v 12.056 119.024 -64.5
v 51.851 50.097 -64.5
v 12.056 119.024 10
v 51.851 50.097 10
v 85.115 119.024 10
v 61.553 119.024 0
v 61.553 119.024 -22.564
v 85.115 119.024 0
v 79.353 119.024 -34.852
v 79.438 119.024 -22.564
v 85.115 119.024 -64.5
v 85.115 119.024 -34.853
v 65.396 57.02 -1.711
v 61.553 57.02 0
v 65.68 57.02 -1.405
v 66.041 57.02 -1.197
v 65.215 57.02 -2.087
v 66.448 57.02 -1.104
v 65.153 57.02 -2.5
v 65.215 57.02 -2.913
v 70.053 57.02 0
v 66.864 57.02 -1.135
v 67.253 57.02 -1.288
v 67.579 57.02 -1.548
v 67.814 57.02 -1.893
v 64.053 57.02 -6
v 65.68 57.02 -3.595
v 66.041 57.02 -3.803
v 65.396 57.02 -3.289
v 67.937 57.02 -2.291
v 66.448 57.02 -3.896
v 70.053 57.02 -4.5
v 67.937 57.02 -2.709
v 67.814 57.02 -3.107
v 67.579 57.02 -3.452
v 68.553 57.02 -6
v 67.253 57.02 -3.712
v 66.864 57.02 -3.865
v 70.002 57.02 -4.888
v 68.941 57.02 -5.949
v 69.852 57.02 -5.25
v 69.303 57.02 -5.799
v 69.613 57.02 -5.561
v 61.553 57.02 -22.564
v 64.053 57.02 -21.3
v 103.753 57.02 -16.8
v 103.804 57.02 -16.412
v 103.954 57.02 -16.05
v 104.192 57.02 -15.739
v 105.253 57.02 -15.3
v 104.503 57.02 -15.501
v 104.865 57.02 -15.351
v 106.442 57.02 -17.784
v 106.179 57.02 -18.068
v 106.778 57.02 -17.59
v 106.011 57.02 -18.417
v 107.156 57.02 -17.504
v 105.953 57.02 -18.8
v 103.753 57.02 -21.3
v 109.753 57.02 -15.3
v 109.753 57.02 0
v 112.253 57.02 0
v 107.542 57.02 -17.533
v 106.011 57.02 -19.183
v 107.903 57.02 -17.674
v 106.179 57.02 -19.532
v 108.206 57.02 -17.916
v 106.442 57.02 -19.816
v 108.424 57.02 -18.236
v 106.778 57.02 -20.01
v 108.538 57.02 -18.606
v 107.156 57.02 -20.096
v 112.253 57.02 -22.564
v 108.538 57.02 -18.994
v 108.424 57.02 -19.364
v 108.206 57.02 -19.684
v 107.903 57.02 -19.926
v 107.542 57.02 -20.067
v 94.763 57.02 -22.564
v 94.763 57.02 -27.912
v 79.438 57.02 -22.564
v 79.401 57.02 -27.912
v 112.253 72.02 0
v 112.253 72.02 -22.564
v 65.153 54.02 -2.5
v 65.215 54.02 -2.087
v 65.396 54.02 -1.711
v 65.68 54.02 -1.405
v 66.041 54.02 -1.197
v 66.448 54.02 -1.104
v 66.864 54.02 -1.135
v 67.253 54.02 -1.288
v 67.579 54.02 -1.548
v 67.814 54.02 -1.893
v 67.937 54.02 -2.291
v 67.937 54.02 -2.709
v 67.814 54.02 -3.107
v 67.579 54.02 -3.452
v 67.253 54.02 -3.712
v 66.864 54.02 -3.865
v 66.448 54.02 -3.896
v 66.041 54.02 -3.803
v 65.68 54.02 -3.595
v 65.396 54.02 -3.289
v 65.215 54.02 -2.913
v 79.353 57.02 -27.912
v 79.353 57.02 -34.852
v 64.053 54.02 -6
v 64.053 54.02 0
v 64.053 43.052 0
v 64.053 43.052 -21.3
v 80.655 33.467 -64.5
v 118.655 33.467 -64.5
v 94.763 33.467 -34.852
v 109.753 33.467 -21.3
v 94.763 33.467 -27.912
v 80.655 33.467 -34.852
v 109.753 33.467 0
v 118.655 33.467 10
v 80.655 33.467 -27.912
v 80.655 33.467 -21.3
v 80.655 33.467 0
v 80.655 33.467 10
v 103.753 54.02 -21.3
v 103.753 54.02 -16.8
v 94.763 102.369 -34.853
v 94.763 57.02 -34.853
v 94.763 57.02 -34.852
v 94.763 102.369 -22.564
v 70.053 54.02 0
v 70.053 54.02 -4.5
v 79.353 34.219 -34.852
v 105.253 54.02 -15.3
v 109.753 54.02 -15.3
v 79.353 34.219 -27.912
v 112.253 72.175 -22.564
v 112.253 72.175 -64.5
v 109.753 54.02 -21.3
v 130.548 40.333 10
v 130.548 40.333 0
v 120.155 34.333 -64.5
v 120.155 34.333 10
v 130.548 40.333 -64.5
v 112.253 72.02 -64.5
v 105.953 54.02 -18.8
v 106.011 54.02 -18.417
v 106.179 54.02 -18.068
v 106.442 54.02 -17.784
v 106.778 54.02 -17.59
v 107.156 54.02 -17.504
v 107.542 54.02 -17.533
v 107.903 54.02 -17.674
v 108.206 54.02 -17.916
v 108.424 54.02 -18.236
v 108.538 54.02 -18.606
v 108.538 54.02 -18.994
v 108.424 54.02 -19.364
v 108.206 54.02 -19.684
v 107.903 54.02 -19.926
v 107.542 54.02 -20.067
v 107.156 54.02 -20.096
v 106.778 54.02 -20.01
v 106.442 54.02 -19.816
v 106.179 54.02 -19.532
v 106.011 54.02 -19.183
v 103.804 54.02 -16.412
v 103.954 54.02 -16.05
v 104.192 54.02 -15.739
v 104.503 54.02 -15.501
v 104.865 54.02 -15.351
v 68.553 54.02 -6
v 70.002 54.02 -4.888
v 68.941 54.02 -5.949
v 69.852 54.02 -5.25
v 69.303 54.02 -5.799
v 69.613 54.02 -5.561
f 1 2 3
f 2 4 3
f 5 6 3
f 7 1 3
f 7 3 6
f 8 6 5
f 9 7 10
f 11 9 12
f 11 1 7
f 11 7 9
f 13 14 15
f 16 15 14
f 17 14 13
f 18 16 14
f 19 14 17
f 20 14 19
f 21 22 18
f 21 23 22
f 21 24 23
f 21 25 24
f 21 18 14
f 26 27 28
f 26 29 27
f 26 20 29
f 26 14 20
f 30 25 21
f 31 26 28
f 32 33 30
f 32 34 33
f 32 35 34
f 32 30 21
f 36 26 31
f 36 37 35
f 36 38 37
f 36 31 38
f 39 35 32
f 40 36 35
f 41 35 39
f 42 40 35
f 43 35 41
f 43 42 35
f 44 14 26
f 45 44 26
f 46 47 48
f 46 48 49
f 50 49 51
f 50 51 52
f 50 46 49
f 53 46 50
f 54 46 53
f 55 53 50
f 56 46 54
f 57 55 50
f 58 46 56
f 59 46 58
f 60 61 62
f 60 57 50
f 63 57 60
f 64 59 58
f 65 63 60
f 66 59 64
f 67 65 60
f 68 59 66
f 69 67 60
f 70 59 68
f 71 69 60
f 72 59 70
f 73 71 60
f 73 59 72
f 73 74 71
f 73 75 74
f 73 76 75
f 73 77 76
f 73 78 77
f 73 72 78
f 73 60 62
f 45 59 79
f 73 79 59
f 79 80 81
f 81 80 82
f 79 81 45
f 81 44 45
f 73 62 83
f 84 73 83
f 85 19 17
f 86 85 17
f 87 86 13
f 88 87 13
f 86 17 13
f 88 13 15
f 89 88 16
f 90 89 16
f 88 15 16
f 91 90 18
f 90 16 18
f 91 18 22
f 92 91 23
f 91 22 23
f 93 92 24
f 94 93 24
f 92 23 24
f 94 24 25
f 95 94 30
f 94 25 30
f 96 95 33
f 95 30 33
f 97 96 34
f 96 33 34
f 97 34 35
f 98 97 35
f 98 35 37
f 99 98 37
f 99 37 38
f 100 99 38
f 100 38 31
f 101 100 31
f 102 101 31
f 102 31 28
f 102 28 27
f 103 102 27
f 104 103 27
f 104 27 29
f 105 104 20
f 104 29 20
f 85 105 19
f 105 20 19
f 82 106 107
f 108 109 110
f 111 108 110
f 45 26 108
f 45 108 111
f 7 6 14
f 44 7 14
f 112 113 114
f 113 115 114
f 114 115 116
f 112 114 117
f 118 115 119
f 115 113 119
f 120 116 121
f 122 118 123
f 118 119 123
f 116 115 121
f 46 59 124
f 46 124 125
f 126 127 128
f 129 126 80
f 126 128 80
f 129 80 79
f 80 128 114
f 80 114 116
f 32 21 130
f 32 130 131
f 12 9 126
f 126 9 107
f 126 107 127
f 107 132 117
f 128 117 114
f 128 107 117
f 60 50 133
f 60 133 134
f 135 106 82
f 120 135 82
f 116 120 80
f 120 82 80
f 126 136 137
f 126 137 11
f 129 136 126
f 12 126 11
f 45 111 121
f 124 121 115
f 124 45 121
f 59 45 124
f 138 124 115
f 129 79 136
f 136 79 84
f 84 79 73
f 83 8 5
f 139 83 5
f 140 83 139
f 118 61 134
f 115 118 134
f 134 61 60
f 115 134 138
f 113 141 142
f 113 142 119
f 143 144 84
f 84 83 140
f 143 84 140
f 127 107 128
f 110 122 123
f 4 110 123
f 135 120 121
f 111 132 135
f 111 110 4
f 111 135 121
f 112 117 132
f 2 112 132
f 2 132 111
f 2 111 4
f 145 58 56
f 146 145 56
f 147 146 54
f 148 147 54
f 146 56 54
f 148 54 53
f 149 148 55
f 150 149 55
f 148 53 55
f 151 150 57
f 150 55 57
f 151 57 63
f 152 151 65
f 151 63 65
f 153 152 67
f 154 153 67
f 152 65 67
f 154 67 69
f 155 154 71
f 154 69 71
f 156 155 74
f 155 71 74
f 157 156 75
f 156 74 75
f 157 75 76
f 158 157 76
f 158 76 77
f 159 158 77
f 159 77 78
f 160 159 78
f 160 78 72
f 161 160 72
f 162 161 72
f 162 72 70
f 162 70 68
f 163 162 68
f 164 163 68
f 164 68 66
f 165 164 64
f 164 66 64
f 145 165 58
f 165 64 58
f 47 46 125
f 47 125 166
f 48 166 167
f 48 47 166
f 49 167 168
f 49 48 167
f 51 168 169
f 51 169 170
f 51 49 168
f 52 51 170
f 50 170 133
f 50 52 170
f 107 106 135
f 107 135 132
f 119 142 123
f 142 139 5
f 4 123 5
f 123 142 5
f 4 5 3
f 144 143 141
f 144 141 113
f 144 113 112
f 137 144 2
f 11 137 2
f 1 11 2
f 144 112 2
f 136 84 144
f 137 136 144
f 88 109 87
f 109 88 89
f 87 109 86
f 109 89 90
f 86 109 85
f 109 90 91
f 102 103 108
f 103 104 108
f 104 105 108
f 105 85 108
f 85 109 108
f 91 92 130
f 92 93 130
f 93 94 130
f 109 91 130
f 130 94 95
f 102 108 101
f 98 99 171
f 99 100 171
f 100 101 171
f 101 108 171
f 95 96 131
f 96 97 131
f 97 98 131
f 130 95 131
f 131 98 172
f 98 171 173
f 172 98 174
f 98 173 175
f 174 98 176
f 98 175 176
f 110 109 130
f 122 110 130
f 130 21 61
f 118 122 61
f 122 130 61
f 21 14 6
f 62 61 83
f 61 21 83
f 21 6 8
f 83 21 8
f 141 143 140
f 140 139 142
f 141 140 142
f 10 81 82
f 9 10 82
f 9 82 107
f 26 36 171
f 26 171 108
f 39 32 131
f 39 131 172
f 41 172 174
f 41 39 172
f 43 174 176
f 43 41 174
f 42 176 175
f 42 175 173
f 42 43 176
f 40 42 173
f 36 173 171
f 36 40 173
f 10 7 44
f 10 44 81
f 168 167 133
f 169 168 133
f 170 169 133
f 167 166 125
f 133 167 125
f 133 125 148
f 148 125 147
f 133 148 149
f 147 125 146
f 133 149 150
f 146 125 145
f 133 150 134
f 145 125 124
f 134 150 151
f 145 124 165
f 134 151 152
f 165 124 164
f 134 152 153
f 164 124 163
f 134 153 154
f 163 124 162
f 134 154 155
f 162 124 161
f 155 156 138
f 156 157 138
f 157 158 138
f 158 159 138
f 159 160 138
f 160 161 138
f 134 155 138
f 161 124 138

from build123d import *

# Parameters (mm, degrees)
EXTRUDE_1_DEPTH     = 10
EXTRUDE_2_DEPTH     = 64.5
CUT_EXTRUDE_1_REACH = 160.264
SKETCH_4_W          = 45.7
SKETCH_4_H          = 21.3
SKETCH_5_R          = 1.4
SKETCH_5_R_2        = 1.3
EXTRUDE_4_DEPTH     = 3
CUT_EXTRUDE_2_REACH = 160.264
SKETCH_6_W          = 15.410459276
SKETCH_6_H          = 6.940839766
EXTRUDE_7_REACH     = 160.264
CUT_EXTRUDE_3_REACH = 193.728
CUT_EXTRUDE_4_REACH = 193.728
CUT_EXTRUDE_5_REACH = 193.728


with BuildPart() as part:
    # 草圖1 → 填料-伸長1 (new body)
    with BuildSketch(Plane.XY):
        Polygon((85.115442282, 119.023705311), (130.547793458, 40.332564766), (120.155488613, 34.332564766), (120.655488613, 33.466539362), (80.655488613, 33.466539362), (51.851130238, 50.096743424), (12.056130238, 119.023705311), align=None)
        Polygon((51.851130238, 50.096743424), (45.007721115, 46.145699324), (80.655488613, 25.564451164), (80.655488613, 33.466539362), align=None)
    extrude(amount=EXTRUDE_1_DEPTH)

    # 草圖2 → 填料-伸長2 (add)
    with BuildSketch(Plane(origin=(0, 0, 0), x_dir=(-1, 0, 0), z_dir=(0, 0, -1))):
        Polygon((-80.655488613, 33.466539362), (-80.655488613, 25.564451164), (-45.007721115, 46.145699324), (-51.851130238, 50.096743424), (-12.056130238, 119.023705311), (-61.552757034, 119.023705311), (-61.552757034, 57.020497378), (-112.252757034, 57.020497378), (-112.252757034, 72.020497378), (-130.547793458, 40.332564766), (-120.155488613, 34.332564766), (-120.655488613, 33.466539362), align=None)
    extrude(amount=EXTRUDE_2_DEPTH)

    # 草圖4 → 除料-伸長1 (cut, up to next)
    with BuildSketch(Plane(origin=(0, 57.020497378, 0), x_dir=(1, 0, 0), z_dir=(0, 1, 0)), mode=Mode.PRIVATE) as cut_extrude_1_sk1:
        with Locations((86.902757034, 10.65)):
            Rectangle(SKETCH_4_W, SKETCH_4_H)
    cut_extrude_1_tool1 = extrude(cut_extrude_1_sk1.sketch, amount=-CUT_EXTRUDE_1_REACH, mode=Mode.PRIVATE) & part.part
    add(cut_extrude_1_tool1.solids().sort_by_distance((86.902757, 57.020497, -10.65))[0], mode=Mode.SUBTRACT)

    # 草圖5 → 填料-伸長4 (add)
    # profile 1 of 2: a face of its own
    with BuildSketch(Plane(origin=(0, 57.020497378, 0), x_dir=(1, 0, 0), z_dir=(0, 1, 0))):
        with BuildLine():
            Line((64.052757034, 6), (64.052757034, 0))
            Line((64.052757034, 0), (70.052757034, 0))
            Line((70.052757034, 0), (70.052757034, 4.5))
            ThreePointArc((70.052757034, 4.5), (69.613417206, 5.560660172), (68.552757034, 6))
            Line((68.552757034, 6), (64.052757034, 6))
        make_face()
        with Locations(Location((66.552757034, 2.5, 0), (0, 0, 180))):
            Circle(SKETCH_5_R, mode=Mode.SUBTRACT)
    # profile 2 of 2: a face of its own
    with BuildSketch(Plane(origin=(0, 57.020497378, 0), x_dir=(1, 0, 0), z_dir=(0, 1, 0))):
        with BuildLine():
            Line((109.752757034, 15.3), (109.752757034, 21.3))
            Line((109.752757034, 21.3), (103.752757034, 21.3))
            Line((103.752757034, 21.3), (103.752757034, 16.8))
            ThreePointArc((103.752757034, 16.8), (104.192096863, 15.739339828), (105.252757034, 15.3))
            Line((105.252757034, 15.3), (109.752757034, 15.3))
        make_face()
        with Locations(Location((107.252757034, 18.8, 0), (0, 0, 180))):
            Circle(SKETCH_5_R_2, mode=Mode.SUBTRACT)
    extrude(amount=-EXTRUDE_4_DEPTH)

    # 草圖6 → 除料-伸長2 (cut, up to next)
    with BuildSketch(Plane(origin=(0, 57.020497378, 0), x_dir=(1, 0, 0), z_dir=(0, 1, 0)), mode=Mode.PRIVATE) as cut_extrude_2_sk1:
        with Locations((87.057792718, 31.382043144)):
            Rectangle(SKETCH_6_W, SKETCH_6_H)
    cut_extrude_2_tool1 = extrude(cut_extrude_2_sk1.sketch, amount=-CUT_EXTRUDE_2_REACH, mode=Mode.PRIVATE) & part.part
    add(cut_extrude_2_tool1.solids().sort_by_distance((87.057793, 57.020497, -31.382043))[0], mode=Mode.SUBTRACT)

    # 填料-伸長7: up to this face of the body (flat: up to its plane)
    extrude_7_end = Plane(part.part.faces().sort_by_distance((38.998451389, 119.023705311, -25.313032677))[0])
    # 草圖7 → 填料-伸長7 (add, up to the picked face)
    with BuildSketch(Plane(origin=(0, 57.020497378, 0), x_dir=(1, 0, 0), z_dir=(0, 1, 0)), mode=Mode.PRIVATE) as extrude_7_sk1:
        Polygon((94.763022356, 34.85318293), (94.763022356, 22.563502169), (112.252757034, 22.563502169), (112.252757034, 64.5), (61.552757034, 64.5), (61.552757034, 22.563502169), (79.438288953, 22.563502169), (79.35256308, 34.852463027), align=None)
    extrude_7_tool1 = split(extrude(extrude_7_sk1.sketch, amount=EXTRUDE_7_REACH, mode=Mode.PRIVATE), bisect_by=extrude_7_end, keep=Keep.BOTH, mode=Mode.PRIVATE)
    add(extrude_7_tool1.solids().sort_by(Axis((86.885549, 57.020497, -44.976252), (0, 1, 0)))[0])

    # 除料-伸長3: up to this face of the body (flat: up to its plane)
    cut_extrude_3_end = Plane(part.part.faces().sort_by_distance((75.490043398, 78.531685691, -64.5))[0])
    # 草圖9 → 除料-伸長3 (cut, up to the picked face)
    with BuildSketch(Plane.XY.offset(10), mode=Mode.PRIVATE) as cut_extrude_3_sk1:
        Polygon((85.115442282, 119.023705311), (125.857264431, 119.023705311), (125.857264431, 48.688632151), align=None)
    cut_extrude_3_tool1 = split(extrude(cut_extrude_3_sk1.sketch, amount=-CUT_EXTRUDE_3_REACH, mode=Mode.PRIVATE), bisect_by=cut_extrude_3_end, keep=Keep.BOTH, mode=Mode.PRIVATE)
    add(cut_extrude_3_tool1.solids().sort_by(Axis((112.276657, 95.578681, 10), (0, 0, -1)))[0], mode=Mode.SUBTRACT)

    # 草圖10 → 除料-伸長4 (cut, up to next)
    with BuildSketch(Plane(origin=(0, 0, -64.5), x_dir=(-1, 0, 0), z_dir=(0, 0, -1)), mode=Mode.PRIVATE) as cut_extrude_4_sk1:
        Polygon((-120.155488613, 34.332564766), (-118.655488613, 33.466539362), (-120.655488613, 33.466539362), align=None)
    cut_extrude_4_tool1 = extrude(cut_extrude_4_sk1.sketch, amount=-CUT_EXTRUDE_4_REACH, mode=Mode.PRIVATE) & part.part
    add(cut_extrude_4_tool1.solids().sort_by_distance((119.822155, 33.755214, -64.5))[0], mode=Mode.SUBTRACT)

    # 草圖11 → 除料-伸長5 (cut, up to next)
    with BuildSketch(Plane(origin=(0, 0, -64.5), x_dir=(-1, 0, 0), z_dir=(0, 0, -1)), mode=Mode.PRIVATE) as cut_extrude_5_sk1:
        Polygon((-45.007721115, 46.145699324), (-80.655488613, 25.564451164), (-80.655488613, 33.466539362), (-51.851130238, 50.096743424), align=None)
    cut_extrude_5_tool1 = extrude(cut_extrude_5_sk1.sketch, amount=-CUT_EXTRUDE_5_REACH, mode=Mode.PRIVATE) & part.part
    add(cut_extrude_5_tool1.solids().sort_by_distance((64.481905, 38.71348, -64.5))[0], mode=Mode.SUBTRACT)


solid = part.part
